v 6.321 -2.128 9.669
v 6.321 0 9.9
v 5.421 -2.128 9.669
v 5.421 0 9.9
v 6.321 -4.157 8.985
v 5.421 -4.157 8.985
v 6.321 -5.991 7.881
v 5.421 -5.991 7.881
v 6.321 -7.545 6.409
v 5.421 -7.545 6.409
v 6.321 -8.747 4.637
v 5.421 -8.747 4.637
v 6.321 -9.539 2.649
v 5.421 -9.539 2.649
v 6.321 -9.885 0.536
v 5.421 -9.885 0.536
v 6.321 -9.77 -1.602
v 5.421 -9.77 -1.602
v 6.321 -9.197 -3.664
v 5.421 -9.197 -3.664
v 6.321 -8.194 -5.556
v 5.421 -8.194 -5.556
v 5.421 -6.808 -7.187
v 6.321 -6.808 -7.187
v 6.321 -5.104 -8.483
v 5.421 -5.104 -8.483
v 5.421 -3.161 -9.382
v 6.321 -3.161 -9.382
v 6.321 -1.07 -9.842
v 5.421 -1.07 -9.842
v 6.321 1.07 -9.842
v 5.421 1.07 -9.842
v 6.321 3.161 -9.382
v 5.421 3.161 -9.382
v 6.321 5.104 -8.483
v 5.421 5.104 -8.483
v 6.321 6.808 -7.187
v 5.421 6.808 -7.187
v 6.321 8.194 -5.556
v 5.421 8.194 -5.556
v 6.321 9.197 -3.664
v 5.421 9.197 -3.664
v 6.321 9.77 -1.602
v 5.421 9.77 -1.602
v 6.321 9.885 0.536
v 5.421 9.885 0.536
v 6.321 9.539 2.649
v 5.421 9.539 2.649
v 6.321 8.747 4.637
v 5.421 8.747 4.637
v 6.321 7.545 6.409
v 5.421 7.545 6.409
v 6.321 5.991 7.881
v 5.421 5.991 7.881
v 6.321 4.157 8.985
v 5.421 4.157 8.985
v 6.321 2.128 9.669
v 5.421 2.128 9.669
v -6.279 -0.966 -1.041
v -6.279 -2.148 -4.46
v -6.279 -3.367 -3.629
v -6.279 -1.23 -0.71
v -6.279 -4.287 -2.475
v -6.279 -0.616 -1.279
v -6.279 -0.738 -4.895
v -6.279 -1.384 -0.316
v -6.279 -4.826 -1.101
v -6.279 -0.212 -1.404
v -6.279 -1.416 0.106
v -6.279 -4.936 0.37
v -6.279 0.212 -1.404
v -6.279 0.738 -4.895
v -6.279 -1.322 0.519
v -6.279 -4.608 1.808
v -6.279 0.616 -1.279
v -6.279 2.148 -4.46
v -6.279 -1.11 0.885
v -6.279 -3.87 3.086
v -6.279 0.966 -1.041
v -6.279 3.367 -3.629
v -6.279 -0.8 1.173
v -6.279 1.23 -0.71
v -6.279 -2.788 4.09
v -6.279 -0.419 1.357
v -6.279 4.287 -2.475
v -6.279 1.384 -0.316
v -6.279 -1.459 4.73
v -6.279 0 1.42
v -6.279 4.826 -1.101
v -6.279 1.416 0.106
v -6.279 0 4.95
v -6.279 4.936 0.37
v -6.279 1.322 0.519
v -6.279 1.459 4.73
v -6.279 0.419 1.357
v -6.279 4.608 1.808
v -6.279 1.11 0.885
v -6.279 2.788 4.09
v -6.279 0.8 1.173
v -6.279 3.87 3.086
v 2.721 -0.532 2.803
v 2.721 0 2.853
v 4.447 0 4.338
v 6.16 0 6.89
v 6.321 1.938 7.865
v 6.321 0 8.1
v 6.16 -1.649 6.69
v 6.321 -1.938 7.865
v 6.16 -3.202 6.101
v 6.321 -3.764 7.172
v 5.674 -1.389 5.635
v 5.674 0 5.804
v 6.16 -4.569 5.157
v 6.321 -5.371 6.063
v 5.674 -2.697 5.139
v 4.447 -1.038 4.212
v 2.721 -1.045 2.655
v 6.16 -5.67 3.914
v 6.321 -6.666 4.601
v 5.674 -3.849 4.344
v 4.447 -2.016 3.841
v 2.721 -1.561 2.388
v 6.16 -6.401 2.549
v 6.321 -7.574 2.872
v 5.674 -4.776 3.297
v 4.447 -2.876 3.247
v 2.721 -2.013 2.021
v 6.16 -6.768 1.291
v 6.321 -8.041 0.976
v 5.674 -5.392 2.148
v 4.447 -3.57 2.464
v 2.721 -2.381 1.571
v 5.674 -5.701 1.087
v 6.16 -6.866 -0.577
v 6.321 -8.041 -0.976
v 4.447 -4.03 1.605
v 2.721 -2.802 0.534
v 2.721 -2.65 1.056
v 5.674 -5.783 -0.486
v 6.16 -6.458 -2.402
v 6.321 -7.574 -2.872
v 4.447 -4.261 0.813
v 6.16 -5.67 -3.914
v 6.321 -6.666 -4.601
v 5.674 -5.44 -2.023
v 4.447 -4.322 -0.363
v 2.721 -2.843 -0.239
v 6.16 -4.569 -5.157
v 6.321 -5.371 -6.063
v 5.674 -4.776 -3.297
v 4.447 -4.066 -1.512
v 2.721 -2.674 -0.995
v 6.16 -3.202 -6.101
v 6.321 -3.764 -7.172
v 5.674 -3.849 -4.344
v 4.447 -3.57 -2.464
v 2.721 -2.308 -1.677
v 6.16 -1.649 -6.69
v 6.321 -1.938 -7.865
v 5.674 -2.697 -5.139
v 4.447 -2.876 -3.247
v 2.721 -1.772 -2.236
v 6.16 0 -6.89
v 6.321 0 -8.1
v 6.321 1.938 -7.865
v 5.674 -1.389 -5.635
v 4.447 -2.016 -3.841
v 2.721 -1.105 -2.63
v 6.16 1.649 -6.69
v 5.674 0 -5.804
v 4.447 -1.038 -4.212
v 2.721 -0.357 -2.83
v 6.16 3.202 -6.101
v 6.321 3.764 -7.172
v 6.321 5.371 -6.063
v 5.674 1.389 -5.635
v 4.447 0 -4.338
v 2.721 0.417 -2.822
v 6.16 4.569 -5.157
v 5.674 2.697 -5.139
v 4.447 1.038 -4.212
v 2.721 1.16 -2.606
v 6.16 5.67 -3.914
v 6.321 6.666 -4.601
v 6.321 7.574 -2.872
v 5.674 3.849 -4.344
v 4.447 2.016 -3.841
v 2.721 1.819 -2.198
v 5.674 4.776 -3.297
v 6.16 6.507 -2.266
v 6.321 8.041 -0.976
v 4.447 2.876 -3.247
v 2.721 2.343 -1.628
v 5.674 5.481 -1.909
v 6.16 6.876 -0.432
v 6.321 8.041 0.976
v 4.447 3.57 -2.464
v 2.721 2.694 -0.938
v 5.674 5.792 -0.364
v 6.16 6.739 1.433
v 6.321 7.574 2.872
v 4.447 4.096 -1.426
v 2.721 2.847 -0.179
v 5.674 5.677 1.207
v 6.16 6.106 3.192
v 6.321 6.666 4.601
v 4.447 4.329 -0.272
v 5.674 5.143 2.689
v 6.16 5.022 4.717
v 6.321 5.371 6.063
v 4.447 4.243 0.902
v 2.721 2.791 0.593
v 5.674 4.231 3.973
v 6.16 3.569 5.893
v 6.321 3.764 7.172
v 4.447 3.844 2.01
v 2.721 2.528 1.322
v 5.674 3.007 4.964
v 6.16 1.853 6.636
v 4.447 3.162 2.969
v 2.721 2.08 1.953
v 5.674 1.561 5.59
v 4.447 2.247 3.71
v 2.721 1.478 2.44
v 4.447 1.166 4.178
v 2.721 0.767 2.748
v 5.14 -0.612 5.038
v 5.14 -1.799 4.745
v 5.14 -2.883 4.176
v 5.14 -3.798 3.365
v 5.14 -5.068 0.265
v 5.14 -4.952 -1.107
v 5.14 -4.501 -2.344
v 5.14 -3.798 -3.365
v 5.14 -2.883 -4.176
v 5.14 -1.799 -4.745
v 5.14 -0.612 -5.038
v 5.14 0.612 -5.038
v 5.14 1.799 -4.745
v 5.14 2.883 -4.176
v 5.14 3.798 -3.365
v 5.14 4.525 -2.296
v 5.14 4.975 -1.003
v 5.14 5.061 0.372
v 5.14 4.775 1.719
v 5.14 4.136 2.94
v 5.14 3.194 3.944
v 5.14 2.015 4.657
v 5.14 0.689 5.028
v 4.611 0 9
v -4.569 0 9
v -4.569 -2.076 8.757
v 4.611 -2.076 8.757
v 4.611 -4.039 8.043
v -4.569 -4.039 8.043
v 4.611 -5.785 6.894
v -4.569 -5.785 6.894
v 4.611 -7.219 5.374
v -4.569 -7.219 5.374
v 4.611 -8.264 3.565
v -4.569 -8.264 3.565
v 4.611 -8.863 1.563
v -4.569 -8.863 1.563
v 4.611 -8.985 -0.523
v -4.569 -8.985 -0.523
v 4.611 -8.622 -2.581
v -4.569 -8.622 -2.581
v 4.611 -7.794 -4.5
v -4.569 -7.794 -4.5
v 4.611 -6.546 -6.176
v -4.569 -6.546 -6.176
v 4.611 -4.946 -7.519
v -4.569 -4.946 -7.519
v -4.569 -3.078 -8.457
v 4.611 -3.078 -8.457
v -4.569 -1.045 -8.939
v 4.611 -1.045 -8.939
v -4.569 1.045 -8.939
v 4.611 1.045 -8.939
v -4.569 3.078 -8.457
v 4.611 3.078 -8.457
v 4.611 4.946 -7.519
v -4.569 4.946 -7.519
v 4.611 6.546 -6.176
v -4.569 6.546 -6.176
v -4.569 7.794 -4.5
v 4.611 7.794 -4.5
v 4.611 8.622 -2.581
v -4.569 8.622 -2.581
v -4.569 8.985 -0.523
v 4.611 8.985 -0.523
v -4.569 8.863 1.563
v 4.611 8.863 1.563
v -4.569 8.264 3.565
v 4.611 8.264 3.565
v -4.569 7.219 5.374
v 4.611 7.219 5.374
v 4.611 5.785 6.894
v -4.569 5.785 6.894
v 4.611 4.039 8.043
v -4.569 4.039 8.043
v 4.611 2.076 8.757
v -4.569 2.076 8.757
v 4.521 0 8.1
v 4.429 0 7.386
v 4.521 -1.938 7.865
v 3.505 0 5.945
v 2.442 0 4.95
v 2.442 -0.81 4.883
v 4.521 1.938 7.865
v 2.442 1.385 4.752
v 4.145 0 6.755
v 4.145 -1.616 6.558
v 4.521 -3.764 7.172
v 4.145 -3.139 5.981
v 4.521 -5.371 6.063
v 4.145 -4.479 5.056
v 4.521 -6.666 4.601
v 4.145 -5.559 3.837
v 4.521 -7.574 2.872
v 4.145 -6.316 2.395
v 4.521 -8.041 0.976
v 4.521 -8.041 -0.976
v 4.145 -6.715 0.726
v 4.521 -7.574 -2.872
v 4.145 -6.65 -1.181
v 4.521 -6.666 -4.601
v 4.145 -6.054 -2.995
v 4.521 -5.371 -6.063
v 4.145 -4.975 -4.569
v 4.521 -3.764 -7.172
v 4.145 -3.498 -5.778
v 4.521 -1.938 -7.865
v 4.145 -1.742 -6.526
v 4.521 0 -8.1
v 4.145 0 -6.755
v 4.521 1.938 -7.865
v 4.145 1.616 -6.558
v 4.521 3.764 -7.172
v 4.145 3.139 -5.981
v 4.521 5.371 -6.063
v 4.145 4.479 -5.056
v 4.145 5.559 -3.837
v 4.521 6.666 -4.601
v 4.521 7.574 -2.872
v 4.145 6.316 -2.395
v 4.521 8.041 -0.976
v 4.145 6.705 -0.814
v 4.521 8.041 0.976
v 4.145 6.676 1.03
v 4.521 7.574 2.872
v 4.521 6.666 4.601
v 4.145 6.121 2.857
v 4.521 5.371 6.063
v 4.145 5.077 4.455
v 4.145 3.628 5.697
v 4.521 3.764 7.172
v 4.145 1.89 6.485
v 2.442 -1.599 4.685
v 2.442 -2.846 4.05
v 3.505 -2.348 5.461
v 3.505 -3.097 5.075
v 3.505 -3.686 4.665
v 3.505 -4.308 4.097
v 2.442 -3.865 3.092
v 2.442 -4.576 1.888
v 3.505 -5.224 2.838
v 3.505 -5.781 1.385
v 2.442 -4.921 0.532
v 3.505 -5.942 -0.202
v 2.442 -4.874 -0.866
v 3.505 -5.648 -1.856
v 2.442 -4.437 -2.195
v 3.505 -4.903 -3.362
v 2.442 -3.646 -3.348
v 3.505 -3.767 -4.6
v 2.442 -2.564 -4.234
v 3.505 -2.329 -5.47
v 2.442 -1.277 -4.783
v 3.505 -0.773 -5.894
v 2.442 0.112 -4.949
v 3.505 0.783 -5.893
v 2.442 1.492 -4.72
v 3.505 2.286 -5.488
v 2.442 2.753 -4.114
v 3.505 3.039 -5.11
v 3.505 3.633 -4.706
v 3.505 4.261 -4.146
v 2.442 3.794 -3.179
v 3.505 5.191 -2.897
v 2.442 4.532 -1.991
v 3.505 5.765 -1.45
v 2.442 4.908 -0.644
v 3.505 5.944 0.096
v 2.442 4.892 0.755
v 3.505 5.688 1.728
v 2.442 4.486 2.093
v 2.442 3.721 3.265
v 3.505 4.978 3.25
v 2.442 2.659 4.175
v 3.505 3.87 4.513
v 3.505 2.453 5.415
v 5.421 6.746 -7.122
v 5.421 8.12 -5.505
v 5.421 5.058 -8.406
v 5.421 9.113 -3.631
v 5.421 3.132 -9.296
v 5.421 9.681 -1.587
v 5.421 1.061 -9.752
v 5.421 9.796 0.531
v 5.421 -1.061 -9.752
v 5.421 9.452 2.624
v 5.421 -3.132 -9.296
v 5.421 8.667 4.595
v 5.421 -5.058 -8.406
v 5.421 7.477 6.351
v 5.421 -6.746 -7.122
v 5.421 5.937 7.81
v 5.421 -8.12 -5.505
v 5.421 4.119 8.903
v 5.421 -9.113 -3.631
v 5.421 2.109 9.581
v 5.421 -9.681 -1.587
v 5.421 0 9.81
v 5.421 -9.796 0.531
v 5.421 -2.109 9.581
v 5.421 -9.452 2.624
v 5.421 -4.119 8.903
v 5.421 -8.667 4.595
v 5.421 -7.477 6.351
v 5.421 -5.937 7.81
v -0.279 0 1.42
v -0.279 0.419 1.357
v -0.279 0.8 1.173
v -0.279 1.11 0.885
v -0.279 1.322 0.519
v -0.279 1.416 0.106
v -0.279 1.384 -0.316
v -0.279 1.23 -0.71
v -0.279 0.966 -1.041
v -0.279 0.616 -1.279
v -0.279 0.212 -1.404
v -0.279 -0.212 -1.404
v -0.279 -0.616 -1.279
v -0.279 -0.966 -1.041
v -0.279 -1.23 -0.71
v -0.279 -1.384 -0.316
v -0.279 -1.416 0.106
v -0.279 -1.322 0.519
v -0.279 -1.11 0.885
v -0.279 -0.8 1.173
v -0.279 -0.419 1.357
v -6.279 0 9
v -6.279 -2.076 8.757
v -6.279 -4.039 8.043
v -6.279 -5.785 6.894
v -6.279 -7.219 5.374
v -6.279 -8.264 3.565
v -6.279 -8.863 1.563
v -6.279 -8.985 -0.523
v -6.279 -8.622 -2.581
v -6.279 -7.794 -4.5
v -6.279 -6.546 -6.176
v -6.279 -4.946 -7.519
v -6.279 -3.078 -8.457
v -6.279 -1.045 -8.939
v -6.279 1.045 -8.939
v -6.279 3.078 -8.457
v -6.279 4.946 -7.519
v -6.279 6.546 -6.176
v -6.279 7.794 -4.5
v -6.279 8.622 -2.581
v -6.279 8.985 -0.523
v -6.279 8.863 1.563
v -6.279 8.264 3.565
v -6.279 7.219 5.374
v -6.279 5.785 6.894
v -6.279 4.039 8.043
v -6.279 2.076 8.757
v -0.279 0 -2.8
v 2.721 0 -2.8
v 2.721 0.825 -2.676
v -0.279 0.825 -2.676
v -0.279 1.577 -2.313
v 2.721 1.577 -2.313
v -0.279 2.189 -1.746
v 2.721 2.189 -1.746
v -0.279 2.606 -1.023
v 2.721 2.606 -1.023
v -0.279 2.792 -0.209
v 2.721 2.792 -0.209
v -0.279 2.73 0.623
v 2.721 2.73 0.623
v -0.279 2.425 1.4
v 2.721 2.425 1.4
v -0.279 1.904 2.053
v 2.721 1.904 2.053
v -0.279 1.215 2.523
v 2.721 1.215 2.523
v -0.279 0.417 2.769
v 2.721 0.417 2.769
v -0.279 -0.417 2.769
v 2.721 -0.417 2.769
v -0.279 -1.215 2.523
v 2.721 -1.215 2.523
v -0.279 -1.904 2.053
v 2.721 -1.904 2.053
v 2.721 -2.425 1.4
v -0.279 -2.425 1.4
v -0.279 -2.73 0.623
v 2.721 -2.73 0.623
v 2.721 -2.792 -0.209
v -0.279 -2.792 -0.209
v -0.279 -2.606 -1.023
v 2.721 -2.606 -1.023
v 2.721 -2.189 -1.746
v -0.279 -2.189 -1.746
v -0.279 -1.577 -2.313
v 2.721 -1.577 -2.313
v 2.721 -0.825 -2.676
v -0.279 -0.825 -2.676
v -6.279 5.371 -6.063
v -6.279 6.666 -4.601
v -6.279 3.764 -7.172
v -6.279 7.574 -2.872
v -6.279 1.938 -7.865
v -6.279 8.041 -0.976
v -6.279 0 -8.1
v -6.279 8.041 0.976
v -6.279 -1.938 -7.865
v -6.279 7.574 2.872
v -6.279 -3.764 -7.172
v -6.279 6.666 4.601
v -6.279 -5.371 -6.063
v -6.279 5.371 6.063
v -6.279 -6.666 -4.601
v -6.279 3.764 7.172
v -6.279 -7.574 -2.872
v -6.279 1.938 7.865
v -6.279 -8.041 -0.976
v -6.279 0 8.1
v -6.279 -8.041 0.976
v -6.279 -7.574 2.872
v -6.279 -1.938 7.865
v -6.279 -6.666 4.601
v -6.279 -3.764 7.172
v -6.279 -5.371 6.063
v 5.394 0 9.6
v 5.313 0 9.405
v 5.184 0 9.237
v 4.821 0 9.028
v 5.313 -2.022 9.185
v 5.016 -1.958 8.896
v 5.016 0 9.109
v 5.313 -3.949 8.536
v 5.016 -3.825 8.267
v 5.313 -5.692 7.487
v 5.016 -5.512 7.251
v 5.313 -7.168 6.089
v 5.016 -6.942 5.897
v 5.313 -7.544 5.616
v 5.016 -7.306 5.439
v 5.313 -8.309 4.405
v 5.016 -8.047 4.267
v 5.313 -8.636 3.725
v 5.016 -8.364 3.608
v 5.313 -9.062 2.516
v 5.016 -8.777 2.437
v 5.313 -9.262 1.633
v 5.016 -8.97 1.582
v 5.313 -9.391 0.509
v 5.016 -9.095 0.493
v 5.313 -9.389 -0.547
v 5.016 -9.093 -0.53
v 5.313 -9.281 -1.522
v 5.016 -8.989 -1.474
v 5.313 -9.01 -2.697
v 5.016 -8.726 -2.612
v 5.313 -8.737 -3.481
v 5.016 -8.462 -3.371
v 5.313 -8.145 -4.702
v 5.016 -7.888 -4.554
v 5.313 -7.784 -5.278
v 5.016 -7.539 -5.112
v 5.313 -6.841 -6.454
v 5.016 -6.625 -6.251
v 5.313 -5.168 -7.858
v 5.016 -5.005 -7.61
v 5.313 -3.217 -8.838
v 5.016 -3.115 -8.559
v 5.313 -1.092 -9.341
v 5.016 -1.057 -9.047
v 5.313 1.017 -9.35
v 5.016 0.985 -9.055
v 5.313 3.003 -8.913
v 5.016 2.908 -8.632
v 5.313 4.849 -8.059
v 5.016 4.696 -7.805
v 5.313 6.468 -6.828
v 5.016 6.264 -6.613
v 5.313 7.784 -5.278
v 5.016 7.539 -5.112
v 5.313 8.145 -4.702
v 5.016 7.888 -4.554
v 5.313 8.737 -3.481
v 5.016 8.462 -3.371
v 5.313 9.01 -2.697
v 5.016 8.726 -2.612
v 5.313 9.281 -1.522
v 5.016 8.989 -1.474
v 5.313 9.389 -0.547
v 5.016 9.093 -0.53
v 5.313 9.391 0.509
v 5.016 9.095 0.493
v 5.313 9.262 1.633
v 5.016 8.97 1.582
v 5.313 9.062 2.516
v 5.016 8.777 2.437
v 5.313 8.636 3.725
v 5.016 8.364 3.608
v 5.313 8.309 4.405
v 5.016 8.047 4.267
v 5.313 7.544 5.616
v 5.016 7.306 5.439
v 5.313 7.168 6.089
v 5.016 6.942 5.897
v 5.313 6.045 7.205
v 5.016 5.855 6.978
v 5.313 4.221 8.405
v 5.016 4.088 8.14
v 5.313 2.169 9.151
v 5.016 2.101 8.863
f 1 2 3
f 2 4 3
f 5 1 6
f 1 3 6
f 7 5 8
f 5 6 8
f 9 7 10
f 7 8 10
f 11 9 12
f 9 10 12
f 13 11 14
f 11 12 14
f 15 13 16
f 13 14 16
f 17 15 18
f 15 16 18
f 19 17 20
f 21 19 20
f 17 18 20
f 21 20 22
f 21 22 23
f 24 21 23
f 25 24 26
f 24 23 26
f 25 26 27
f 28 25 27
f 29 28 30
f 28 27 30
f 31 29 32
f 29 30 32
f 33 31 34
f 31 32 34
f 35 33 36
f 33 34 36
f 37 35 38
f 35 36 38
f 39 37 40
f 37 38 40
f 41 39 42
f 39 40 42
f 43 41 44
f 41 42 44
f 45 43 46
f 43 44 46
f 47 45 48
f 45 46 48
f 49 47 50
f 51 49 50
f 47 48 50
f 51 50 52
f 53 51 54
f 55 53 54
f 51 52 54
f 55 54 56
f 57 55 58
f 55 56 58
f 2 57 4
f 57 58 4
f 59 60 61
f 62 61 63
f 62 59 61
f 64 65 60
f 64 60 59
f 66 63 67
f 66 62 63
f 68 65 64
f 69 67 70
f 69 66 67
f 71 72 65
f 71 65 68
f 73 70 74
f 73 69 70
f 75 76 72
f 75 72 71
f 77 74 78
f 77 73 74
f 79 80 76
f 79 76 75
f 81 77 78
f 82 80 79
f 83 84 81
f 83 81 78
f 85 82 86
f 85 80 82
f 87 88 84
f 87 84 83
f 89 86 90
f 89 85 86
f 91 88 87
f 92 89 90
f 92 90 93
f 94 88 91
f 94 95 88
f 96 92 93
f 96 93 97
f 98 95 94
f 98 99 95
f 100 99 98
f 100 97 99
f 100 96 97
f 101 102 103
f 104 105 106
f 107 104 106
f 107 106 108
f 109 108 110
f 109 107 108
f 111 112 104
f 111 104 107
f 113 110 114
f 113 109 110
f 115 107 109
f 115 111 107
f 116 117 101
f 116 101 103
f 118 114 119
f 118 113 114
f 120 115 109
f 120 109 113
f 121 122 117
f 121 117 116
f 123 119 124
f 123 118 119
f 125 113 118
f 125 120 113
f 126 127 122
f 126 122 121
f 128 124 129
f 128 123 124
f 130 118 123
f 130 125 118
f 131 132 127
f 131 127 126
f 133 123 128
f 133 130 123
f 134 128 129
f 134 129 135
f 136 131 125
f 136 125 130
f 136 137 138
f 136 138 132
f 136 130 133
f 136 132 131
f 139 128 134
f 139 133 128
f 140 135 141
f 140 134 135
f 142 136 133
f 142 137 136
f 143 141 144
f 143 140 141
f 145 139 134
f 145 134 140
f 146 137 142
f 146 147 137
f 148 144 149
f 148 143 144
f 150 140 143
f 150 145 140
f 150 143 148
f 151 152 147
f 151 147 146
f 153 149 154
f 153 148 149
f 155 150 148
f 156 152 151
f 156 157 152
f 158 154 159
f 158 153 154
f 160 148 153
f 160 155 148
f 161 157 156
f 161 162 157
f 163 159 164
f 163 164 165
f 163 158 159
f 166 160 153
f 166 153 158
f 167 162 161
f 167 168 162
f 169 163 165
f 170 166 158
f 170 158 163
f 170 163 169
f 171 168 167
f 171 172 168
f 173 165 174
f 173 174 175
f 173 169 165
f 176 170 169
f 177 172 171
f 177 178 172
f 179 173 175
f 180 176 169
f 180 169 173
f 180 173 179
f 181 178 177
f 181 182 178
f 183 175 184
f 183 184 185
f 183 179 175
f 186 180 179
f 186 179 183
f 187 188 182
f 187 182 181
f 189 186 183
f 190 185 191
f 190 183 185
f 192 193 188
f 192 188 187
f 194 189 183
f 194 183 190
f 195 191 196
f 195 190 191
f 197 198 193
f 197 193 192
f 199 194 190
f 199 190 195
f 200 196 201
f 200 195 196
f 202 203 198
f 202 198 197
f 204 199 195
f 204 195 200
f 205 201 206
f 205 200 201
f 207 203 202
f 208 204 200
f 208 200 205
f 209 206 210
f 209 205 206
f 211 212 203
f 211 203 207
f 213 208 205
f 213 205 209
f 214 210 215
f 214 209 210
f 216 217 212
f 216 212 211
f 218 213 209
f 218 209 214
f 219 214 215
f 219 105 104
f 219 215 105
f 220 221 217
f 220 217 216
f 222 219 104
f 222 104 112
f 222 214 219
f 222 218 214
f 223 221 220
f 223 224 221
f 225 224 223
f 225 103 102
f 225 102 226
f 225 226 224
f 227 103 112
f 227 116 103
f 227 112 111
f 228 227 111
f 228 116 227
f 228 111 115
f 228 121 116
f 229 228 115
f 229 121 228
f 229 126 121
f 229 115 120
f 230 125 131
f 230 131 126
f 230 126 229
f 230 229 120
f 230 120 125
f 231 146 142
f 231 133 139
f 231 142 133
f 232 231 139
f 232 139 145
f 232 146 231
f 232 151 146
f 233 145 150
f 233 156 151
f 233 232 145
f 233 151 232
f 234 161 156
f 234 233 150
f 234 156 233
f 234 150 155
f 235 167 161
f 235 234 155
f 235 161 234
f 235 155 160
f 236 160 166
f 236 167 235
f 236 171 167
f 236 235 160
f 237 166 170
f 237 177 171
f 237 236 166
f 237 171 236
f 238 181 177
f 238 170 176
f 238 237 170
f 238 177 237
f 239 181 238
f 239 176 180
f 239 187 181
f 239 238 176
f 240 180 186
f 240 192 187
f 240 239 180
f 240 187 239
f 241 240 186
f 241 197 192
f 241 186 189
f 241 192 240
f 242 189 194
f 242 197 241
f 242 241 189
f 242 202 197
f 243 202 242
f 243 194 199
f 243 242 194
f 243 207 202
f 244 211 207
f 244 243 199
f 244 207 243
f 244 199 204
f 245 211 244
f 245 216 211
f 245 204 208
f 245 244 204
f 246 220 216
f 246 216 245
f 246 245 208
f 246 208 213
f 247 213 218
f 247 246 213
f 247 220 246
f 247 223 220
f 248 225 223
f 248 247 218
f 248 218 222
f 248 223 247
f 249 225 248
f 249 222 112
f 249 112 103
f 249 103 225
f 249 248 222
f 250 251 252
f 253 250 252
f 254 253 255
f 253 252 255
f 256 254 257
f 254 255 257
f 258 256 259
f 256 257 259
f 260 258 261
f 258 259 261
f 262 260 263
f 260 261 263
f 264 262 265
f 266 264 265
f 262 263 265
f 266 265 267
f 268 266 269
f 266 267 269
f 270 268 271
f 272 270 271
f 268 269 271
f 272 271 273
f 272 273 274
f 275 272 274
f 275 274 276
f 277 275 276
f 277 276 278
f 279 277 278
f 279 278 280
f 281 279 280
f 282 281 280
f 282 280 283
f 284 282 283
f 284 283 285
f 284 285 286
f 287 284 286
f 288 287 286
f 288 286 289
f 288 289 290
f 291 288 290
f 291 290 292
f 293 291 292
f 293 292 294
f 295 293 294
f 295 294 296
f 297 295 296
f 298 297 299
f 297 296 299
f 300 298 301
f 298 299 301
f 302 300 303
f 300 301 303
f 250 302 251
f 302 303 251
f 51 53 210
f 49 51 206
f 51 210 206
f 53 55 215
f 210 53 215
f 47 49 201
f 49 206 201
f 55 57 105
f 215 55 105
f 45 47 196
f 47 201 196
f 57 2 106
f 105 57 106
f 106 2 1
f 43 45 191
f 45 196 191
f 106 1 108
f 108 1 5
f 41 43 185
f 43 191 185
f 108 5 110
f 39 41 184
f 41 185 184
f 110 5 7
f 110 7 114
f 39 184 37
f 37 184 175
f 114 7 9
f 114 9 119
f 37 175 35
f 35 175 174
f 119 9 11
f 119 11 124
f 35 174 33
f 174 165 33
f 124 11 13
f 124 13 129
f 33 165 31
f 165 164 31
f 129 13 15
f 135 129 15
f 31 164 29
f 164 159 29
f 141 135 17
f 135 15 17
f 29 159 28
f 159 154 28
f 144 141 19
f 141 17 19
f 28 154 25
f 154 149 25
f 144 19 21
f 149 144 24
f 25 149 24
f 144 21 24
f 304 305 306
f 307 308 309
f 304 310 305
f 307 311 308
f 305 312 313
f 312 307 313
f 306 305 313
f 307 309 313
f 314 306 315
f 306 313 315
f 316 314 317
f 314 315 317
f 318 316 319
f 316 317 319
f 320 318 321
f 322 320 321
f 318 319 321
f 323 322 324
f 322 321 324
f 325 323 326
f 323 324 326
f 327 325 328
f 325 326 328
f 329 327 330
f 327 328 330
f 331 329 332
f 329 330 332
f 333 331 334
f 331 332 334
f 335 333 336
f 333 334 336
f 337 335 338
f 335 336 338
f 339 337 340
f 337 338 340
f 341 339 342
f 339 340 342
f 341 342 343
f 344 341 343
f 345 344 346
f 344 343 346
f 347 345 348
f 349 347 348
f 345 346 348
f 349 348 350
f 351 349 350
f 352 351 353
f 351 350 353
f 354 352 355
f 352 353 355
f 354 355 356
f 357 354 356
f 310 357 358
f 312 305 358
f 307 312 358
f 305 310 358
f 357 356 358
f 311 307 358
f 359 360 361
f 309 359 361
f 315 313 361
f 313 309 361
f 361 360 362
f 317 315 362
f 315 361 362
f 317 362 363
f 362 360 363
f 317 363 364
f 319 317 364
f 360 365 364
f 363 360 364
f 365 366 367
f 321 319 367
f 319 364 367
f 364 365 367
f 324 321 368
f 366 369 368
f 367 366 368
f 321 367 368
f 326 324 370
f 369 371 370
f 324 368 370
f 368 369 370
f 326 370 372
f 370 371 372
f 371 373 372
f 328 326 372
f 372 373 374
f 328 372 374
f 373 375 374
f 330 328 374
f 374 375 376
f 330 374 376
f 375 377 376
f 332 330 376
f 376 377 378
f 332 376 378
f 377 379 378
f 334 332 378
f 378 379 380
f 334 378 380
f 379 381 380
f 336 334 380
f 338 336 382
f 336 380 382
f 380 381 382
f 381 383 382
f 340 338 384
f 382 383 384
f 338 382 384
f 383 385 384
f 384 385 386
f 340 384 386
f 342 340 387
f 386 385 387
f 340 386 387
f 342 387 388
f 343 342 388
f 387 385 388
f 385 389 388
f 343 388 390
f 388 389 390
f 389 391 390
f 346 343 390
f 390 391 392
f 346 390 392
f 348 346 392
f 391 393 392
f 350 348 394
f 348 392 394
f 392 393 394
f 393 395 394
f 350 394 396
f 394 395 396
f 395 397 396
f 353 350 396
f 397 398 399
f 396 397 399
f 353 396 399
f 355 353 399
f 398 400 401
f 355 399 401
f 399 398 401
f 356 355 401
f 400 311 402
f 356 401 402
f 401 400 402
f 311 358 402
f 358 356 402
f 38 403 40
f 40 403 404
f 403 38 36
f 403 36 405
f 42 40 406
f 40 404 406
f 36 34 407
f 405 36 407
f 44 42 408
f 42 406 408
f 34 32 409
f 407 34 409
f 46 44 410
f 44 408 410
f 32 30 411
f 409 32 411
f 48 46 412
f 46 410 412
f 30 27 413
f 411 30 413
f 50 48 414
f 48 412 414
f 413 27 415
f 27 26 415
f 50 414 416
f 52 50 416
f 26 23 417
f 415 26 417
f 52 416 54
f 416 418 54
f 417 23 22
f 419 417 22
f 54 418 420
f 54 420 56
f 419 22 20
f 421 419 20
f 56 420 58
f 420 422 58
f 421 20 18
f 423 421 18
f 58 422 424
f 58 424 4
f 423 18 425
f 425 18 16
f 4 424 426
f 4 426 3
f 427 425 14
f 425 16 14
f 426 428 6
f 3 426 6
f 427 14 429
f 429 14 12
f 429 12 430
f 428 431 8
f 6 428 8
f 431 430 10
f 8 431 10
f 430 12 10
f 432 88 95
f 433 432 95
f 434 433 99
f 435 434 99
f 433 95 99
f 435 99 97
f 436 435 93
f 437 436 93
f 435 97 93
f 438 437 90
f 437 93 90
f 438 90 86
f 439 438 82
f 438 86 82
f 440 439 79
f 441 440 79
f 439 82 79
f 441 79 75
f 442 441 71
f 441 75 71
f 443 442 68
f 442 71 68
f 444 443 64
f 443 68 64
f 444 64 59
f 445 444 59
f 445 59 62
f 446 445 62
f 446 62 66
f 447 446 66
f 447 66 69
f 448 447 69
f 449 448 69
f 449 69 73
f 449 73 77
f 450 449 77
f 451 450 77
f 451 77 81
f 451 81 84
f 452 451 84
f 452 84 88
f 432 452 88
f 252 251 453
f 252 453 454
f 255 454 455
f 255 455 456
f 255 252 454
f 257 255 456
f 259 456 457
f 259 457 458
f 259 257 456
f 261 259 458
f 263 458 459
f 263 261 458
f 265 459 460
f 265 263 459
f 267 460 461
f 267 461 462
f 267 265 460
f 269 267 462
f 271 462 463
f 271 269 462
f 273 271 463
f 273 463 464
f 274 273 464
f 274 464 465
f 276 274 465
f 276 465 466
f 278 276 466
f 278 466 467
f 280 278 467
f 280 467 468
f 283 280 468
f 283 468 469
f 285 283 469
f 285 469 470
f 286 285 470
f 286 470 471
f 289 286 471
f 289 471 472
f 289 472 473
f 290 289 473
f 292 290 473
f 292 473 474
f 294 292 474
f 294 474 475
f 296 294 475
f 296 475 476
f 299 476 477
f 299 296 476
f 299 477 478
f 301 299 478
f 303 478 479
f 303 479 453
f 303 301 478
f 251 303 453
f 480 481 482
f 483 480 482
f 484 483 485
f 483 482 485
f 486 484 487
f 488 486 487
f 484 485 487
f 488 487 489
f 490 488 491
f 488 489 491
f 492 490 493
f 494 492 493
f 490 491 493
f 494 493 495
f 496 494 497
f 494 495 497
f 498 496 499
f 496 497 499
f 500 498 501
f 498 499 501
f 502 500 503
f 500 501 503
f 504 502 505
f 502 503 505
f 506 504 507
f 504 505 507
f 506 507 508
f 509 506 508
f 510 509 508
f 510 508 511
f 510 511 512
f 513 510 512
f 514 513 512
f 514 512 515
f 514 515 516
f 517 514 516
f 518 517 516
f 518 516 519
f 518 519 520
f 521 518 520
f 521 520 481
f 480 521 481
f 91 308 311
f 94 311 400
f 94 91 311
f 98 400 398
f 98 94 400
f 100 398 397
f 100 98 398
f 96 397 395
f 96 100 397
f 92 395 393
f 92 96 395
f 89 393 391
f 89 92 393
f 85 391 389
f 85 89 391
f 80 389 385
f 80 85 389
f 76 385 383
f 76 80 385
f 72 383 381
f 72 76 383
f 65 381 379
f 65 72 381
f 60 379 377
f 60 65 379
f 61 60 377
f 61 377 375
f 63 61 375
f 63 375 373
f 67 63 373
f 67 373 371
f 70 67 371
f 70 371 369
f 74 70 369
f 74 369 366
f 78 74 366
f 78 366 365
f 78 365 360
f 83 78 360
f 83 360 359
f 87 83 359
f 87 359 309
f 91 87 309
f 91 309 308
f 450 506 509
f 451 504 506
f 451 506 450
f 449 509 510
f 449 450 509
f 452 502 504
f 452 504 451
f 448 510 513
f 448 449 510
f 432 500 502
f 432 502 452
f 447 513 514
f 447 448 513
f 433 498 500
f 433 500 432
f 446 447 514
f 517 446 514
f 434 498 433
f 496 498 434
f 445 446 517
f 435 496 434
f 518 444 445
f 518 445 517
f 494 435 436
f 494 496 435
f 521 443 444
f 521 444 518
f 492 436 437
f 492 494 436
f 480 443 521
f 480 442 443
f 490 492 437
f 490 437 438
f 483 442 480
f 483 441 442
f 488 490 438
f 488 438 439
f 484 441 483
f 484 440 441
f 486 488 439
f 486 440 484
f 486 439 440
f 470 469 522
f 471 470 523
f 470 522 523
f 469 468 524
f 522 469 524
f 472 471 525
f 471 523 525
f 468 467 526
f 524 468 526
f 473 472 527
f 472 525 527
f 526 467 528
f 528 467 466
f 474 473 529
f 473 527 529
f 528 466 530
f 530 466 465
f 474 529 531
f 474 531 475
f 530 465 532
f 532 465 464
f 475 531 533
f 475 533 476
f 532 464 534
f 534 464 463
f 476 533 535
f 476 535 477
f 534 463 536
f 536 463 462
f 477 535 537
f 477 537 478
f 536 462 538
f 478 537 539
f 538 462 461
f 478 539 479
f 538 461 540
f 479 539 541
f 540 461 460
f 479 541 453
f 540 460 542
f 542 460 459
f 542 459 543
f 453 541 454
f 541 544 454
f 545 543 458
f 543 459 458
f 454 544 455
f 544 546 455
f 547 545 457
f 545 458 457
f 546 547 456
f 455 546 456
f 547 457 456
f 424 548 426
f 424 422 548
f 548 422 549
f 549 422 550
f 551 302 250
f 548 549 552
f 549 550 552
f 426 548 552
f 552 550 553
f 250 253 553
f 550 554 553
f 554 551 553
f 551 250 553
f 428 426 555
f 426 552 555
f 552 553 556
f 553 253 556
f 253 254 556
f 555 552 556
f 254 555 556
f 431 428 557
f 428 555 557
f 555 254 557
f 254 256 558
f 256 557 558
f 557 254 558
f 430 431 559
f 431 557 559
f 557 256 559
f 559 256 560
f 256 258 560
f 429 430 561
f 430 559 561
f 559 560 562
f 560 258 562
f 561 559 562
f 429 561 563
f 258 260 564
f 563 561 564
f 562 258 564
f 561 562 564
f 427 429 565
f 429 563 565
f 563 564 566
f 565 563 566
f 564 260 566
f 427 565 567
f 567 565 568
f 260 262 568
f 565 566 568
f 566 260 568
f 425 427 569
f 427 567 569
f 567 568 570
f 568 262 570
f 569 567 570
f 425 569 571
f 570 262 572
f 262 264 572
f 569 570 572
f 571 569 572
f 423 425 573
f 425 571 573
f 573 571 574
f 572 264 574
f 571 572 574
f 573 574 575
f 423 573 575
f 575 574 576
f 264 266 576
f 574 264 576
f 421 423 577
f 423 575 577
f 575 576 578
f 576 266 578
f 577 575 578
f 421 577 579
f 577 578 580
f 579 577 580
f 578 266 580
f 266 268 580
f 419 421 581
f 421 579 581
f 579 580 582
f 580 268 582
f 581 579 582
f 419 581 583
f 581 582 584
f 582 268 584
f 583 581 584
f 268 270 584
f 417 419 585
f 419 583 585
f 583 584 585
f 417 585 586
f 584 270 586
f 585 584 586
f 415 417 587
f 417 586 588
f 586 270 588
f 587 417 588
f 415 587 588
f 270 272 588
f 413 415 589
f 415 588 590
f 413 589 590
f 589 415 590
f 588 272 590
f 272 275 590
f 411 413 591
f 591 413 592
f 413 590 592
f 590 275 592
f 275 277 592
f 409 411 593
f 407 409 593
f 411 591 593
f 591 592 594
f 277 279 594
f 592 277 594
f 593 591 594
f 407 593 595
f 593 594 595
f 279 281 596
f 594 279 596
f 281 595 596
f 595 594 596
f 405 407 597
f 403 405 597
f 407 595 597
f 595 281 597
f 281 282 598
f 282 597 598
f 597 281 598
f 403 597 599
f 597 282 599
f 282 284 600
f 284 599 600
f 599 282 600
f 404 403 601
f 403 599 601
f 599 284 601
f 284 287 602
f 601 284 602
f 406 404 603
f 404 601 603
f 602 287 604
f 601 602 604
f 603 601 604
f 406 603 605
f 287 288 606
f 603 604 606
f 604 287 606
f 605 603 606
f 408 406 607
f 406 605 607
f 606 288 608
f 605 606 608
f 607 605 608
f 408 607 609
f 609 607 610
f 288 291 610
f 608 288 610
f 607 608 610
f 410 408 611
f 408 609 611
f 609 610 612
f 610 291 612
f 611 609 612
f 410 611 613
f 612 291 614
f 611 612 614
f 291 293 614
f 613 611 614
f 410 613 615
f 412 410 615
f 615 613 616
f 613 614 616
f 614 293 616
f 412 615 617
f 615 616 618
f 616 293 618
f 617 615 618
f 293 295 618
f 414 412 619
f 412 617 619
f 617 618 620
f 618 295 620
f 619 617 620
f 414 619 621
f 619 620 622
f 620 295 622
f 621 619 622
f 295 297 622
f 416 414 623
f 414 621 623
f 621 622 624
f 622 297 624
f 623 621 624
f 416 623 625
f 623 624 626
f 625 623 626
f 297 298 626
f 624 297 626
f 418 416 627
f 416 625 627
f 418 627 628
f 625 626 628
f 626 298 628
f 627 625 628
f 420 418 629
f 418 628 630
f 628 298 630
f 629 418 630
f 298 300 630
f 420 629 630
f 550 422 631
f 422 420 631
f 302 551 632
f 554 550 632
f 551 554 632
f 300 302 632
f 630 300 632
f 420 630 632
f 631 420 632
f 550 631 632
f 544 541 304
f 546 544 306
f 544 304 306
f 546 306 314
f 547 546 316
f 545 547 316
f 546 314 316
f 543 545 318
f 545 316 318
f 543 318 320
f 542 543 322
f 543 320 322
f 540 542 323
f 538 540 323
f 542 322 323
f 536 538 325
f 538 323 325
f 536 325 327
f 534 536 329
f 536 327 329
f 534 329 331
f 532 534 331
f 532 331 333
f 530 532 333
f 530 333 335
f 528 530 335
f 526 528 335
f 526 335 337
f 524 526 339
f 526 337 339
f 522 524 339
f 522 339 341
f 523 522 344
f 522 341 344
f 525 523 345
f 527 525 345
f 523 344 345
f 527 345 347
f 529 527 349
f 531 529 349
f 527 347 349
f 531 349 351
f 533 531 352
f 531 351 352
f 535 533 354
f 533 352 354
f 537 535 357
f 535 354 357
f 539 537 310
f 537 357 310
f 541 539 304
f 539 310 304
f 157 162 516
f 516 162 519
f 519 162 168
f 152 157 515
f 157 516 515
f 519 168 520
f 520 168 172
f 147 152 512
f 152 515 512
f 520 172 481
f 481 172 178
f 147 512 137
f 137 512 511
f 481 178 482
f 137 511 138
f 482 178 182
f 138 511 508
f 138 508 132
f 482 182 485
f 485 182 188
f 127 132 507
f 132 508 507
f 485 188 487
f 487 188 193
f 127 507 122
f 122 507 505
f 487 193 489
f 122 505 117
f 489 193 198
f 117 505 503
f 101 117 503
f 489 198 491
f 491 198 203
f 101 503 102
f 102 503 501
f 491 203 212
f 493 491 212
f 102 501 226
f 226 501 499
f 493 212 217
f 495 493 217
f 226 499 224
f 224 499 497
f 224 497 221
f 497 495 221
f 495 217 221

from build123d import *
from OCP.BRepAlgoAPI import BRepAlgoAPI_Cut
from OCP.TopTools import TopTools_ListOfShape

# Parameters (mm, degrees)
SKETCH2_R           = 5.5
SKETCH2_R_2         = 1
BOSS_EXTRUDE1_DEPTH = 10
SCALE1_SCALE        = 0.9
SKETCH3_R           = 2.8
CUT_EXTRUDE1_DEPTH  = 3
SKETCH4_R           = 1.42
CUT_EXTRUDE2_DEPTH  = 7
SKETCH6_R           = 12.614646558
SKETCH6_R_2         = 9
CUT_EXTRUDE3_DEPTH  = 10


with BuildPart() as part:
    # Sketch1 → Revolve1 (revolve)
    with BuildSketch(Plane.XY):
        with BuildLine():
            Line((-7, 9), (5, 9))
            add(Edge.make_bspline(
                [(5, 9), (5, 8.856466181), (4.980630385, 8.552638111), (4.879856885, 8.085906437), (4.637540593, 7.528306389), (3.996049584, 6.69016035), (2.86097235, 5.618747783), (1.478465211, 4.503997435), (0.514957064, 3.794701588), (0.068439653, 3.476275963), (0, 3.427716912)],
                knots=[0, 0, 0, 0, 0.0625, 0.125, 0.25, 0.375, 0.5, 0.625, 0.75, 0.773497894, 0.773497894, 0.773497894, 0.773497894], degree=3))
            Line((0, 3.427716912), (0, 1))
            add(Edge.make_bspline(
                [(7, 9), (7, 7.437991686), (5.451200792, 4.581787455), (0.00160793, 1.001387392), (0, 1)],
                knots=[0, 0, 0, 0, 0.405901642, 1, 1, 1, 1], degree=3))
            Line((7, 9), (7, 11))
            Line((7, 11), (6, 11))
            Line((6, 11), (6, 10.9))
            ThreePointArc((6, 10.9), (5.736396103, 10.263603897), (5.1, 10))
            Line((5.1, 10), (-5.1, 10))
            ThreePointArc((-5.1, 10), (-5.736396103, 10.263603897), (-6, 10.9))
            Line((-6, 10.9), (-6, 11))
            Line((-6, 11), (-7, 11))
            Line((-7, 11), (-7, 9))
        make_face()
    revolve(axis=Axis((0, 0, 0), (1, 0, 0)))

    # Sketch2 → Boss-Extrude1 (add)
    with BuildSketch(Plane.ZY.offset(7)):
        Circle(SKETCH2_R)
        Circle(SKETCH2_R_2, mode=Mode.SUBTRACT)
    extrude(amount=-BOSS_EXTRUDE1_DEPTH)


with BuildPart() as part_1:
    # Scale1: scaled about (0.211743453, 1.2736e-05, 1.291e-06)
    add(part.part.scale(SCALE1_SCALE).moved(Location((0.021174345, 1.274e-06, 1.29e-07))))

    # Sketch3 → Cut-Extrude1 (cut)
    with BuildSketch(Plane(origin=(2.721175281, 0, 0), x_dir=(0, 0, -1), z_dir=(1, 0, 0))):
        Circle(SKETCH3_R)
    extrude(amount=-CUT_EXTRUDE1_DEPTH, mode=Mode.SUBTRACT)


with BuildPart() as cut_extrude2_tool:
    # Sketch4 → Cut-Extrude2 (new body)
    with BuildSketch(Plane.ZY.offset(6.278824719)):
        with Locations((-8.53e-07, 0)):
            Circle(SKETCH4_R)
    extrude(amount=-CUT_EXTRUDE2_DEPTH)


with BuildPart() as part_2:
    add(part_1.part)

    # Cut-Extrude2: cut by cut_extrude2_tool, with a tolerance
    cut_extrude2_stock = TopTools_ListOfShape()
    cut_extrude2_stock.Append(part_2.part.wrapped)
    cut_extrude2_tools = TopTools_ListOfShape()
    cut_extrude2_tools.Append(cut_extrude2_tool.part.wrapped)
    cut_extrude2_cut = BRepAlgoAPI_Cut()
    cut_extrude2_cut.SetArguments(cut_extrude2_stock)
    cut_extrude2_cut.SetTools(cut_extrude2_tools)
    cut_extrude2_cut.SetFuzzyValue(0.00001)
    cut_extrude2_cut.Build()
    add(Compound.cast(cut_extrude2_cut.Shape()).solids(), mode=Mode.REPLACE)


with BuildPart() as cut_extrude3_tool:
    # Sketch6 → Cut-Extrude3 (new body)
    with BuildSketch(Plane(origin=(0, 0, 0), x_dir=(0, 0, -1), z_dir=(1, 0, 0))):
        with Locations((8.53e-07, 0)):
            Circle(SKETCH6_R)
        with Locations((8.53e-07, 0)):
            Circle(SKETCH6_R_2, mode=Mode.SUBTRACT)
    extrude(amount=-CUT_EXTRUDE3_DEPTH)


with BuildPart() as part_3:
    add(part_2.part)

    # Cut-Extrude3: cut by cut_extrude3_tool, with a tolerance
    cut_extrude3_stock = TopTools_ListOfShape()
    cut_extrude3_stock.Append(part_3.part.wrapped)
    cut_extrude3_tools = TopTools_ListOfShape()
    cut_extrude3_tools.Append(cut_extrude3_tool.part.wrapped)
    cut_extrude3_cut = BRepAlgoAPI_Cut()
    cut_extrude3_cut.SetArguments(cut_extrude3_stock)
    cut_extrude3_cut.SetTools(cut_extrude3_tools)
    cut_extrude3_cut.SetFuzzyValue(0.00001)
    cut_extrude3_cut.Build()
    add(Compound.cast(cut_extrude3_cut.Shape()).solids(), mode=Mode.REPLACE)


solid = part_3.part
